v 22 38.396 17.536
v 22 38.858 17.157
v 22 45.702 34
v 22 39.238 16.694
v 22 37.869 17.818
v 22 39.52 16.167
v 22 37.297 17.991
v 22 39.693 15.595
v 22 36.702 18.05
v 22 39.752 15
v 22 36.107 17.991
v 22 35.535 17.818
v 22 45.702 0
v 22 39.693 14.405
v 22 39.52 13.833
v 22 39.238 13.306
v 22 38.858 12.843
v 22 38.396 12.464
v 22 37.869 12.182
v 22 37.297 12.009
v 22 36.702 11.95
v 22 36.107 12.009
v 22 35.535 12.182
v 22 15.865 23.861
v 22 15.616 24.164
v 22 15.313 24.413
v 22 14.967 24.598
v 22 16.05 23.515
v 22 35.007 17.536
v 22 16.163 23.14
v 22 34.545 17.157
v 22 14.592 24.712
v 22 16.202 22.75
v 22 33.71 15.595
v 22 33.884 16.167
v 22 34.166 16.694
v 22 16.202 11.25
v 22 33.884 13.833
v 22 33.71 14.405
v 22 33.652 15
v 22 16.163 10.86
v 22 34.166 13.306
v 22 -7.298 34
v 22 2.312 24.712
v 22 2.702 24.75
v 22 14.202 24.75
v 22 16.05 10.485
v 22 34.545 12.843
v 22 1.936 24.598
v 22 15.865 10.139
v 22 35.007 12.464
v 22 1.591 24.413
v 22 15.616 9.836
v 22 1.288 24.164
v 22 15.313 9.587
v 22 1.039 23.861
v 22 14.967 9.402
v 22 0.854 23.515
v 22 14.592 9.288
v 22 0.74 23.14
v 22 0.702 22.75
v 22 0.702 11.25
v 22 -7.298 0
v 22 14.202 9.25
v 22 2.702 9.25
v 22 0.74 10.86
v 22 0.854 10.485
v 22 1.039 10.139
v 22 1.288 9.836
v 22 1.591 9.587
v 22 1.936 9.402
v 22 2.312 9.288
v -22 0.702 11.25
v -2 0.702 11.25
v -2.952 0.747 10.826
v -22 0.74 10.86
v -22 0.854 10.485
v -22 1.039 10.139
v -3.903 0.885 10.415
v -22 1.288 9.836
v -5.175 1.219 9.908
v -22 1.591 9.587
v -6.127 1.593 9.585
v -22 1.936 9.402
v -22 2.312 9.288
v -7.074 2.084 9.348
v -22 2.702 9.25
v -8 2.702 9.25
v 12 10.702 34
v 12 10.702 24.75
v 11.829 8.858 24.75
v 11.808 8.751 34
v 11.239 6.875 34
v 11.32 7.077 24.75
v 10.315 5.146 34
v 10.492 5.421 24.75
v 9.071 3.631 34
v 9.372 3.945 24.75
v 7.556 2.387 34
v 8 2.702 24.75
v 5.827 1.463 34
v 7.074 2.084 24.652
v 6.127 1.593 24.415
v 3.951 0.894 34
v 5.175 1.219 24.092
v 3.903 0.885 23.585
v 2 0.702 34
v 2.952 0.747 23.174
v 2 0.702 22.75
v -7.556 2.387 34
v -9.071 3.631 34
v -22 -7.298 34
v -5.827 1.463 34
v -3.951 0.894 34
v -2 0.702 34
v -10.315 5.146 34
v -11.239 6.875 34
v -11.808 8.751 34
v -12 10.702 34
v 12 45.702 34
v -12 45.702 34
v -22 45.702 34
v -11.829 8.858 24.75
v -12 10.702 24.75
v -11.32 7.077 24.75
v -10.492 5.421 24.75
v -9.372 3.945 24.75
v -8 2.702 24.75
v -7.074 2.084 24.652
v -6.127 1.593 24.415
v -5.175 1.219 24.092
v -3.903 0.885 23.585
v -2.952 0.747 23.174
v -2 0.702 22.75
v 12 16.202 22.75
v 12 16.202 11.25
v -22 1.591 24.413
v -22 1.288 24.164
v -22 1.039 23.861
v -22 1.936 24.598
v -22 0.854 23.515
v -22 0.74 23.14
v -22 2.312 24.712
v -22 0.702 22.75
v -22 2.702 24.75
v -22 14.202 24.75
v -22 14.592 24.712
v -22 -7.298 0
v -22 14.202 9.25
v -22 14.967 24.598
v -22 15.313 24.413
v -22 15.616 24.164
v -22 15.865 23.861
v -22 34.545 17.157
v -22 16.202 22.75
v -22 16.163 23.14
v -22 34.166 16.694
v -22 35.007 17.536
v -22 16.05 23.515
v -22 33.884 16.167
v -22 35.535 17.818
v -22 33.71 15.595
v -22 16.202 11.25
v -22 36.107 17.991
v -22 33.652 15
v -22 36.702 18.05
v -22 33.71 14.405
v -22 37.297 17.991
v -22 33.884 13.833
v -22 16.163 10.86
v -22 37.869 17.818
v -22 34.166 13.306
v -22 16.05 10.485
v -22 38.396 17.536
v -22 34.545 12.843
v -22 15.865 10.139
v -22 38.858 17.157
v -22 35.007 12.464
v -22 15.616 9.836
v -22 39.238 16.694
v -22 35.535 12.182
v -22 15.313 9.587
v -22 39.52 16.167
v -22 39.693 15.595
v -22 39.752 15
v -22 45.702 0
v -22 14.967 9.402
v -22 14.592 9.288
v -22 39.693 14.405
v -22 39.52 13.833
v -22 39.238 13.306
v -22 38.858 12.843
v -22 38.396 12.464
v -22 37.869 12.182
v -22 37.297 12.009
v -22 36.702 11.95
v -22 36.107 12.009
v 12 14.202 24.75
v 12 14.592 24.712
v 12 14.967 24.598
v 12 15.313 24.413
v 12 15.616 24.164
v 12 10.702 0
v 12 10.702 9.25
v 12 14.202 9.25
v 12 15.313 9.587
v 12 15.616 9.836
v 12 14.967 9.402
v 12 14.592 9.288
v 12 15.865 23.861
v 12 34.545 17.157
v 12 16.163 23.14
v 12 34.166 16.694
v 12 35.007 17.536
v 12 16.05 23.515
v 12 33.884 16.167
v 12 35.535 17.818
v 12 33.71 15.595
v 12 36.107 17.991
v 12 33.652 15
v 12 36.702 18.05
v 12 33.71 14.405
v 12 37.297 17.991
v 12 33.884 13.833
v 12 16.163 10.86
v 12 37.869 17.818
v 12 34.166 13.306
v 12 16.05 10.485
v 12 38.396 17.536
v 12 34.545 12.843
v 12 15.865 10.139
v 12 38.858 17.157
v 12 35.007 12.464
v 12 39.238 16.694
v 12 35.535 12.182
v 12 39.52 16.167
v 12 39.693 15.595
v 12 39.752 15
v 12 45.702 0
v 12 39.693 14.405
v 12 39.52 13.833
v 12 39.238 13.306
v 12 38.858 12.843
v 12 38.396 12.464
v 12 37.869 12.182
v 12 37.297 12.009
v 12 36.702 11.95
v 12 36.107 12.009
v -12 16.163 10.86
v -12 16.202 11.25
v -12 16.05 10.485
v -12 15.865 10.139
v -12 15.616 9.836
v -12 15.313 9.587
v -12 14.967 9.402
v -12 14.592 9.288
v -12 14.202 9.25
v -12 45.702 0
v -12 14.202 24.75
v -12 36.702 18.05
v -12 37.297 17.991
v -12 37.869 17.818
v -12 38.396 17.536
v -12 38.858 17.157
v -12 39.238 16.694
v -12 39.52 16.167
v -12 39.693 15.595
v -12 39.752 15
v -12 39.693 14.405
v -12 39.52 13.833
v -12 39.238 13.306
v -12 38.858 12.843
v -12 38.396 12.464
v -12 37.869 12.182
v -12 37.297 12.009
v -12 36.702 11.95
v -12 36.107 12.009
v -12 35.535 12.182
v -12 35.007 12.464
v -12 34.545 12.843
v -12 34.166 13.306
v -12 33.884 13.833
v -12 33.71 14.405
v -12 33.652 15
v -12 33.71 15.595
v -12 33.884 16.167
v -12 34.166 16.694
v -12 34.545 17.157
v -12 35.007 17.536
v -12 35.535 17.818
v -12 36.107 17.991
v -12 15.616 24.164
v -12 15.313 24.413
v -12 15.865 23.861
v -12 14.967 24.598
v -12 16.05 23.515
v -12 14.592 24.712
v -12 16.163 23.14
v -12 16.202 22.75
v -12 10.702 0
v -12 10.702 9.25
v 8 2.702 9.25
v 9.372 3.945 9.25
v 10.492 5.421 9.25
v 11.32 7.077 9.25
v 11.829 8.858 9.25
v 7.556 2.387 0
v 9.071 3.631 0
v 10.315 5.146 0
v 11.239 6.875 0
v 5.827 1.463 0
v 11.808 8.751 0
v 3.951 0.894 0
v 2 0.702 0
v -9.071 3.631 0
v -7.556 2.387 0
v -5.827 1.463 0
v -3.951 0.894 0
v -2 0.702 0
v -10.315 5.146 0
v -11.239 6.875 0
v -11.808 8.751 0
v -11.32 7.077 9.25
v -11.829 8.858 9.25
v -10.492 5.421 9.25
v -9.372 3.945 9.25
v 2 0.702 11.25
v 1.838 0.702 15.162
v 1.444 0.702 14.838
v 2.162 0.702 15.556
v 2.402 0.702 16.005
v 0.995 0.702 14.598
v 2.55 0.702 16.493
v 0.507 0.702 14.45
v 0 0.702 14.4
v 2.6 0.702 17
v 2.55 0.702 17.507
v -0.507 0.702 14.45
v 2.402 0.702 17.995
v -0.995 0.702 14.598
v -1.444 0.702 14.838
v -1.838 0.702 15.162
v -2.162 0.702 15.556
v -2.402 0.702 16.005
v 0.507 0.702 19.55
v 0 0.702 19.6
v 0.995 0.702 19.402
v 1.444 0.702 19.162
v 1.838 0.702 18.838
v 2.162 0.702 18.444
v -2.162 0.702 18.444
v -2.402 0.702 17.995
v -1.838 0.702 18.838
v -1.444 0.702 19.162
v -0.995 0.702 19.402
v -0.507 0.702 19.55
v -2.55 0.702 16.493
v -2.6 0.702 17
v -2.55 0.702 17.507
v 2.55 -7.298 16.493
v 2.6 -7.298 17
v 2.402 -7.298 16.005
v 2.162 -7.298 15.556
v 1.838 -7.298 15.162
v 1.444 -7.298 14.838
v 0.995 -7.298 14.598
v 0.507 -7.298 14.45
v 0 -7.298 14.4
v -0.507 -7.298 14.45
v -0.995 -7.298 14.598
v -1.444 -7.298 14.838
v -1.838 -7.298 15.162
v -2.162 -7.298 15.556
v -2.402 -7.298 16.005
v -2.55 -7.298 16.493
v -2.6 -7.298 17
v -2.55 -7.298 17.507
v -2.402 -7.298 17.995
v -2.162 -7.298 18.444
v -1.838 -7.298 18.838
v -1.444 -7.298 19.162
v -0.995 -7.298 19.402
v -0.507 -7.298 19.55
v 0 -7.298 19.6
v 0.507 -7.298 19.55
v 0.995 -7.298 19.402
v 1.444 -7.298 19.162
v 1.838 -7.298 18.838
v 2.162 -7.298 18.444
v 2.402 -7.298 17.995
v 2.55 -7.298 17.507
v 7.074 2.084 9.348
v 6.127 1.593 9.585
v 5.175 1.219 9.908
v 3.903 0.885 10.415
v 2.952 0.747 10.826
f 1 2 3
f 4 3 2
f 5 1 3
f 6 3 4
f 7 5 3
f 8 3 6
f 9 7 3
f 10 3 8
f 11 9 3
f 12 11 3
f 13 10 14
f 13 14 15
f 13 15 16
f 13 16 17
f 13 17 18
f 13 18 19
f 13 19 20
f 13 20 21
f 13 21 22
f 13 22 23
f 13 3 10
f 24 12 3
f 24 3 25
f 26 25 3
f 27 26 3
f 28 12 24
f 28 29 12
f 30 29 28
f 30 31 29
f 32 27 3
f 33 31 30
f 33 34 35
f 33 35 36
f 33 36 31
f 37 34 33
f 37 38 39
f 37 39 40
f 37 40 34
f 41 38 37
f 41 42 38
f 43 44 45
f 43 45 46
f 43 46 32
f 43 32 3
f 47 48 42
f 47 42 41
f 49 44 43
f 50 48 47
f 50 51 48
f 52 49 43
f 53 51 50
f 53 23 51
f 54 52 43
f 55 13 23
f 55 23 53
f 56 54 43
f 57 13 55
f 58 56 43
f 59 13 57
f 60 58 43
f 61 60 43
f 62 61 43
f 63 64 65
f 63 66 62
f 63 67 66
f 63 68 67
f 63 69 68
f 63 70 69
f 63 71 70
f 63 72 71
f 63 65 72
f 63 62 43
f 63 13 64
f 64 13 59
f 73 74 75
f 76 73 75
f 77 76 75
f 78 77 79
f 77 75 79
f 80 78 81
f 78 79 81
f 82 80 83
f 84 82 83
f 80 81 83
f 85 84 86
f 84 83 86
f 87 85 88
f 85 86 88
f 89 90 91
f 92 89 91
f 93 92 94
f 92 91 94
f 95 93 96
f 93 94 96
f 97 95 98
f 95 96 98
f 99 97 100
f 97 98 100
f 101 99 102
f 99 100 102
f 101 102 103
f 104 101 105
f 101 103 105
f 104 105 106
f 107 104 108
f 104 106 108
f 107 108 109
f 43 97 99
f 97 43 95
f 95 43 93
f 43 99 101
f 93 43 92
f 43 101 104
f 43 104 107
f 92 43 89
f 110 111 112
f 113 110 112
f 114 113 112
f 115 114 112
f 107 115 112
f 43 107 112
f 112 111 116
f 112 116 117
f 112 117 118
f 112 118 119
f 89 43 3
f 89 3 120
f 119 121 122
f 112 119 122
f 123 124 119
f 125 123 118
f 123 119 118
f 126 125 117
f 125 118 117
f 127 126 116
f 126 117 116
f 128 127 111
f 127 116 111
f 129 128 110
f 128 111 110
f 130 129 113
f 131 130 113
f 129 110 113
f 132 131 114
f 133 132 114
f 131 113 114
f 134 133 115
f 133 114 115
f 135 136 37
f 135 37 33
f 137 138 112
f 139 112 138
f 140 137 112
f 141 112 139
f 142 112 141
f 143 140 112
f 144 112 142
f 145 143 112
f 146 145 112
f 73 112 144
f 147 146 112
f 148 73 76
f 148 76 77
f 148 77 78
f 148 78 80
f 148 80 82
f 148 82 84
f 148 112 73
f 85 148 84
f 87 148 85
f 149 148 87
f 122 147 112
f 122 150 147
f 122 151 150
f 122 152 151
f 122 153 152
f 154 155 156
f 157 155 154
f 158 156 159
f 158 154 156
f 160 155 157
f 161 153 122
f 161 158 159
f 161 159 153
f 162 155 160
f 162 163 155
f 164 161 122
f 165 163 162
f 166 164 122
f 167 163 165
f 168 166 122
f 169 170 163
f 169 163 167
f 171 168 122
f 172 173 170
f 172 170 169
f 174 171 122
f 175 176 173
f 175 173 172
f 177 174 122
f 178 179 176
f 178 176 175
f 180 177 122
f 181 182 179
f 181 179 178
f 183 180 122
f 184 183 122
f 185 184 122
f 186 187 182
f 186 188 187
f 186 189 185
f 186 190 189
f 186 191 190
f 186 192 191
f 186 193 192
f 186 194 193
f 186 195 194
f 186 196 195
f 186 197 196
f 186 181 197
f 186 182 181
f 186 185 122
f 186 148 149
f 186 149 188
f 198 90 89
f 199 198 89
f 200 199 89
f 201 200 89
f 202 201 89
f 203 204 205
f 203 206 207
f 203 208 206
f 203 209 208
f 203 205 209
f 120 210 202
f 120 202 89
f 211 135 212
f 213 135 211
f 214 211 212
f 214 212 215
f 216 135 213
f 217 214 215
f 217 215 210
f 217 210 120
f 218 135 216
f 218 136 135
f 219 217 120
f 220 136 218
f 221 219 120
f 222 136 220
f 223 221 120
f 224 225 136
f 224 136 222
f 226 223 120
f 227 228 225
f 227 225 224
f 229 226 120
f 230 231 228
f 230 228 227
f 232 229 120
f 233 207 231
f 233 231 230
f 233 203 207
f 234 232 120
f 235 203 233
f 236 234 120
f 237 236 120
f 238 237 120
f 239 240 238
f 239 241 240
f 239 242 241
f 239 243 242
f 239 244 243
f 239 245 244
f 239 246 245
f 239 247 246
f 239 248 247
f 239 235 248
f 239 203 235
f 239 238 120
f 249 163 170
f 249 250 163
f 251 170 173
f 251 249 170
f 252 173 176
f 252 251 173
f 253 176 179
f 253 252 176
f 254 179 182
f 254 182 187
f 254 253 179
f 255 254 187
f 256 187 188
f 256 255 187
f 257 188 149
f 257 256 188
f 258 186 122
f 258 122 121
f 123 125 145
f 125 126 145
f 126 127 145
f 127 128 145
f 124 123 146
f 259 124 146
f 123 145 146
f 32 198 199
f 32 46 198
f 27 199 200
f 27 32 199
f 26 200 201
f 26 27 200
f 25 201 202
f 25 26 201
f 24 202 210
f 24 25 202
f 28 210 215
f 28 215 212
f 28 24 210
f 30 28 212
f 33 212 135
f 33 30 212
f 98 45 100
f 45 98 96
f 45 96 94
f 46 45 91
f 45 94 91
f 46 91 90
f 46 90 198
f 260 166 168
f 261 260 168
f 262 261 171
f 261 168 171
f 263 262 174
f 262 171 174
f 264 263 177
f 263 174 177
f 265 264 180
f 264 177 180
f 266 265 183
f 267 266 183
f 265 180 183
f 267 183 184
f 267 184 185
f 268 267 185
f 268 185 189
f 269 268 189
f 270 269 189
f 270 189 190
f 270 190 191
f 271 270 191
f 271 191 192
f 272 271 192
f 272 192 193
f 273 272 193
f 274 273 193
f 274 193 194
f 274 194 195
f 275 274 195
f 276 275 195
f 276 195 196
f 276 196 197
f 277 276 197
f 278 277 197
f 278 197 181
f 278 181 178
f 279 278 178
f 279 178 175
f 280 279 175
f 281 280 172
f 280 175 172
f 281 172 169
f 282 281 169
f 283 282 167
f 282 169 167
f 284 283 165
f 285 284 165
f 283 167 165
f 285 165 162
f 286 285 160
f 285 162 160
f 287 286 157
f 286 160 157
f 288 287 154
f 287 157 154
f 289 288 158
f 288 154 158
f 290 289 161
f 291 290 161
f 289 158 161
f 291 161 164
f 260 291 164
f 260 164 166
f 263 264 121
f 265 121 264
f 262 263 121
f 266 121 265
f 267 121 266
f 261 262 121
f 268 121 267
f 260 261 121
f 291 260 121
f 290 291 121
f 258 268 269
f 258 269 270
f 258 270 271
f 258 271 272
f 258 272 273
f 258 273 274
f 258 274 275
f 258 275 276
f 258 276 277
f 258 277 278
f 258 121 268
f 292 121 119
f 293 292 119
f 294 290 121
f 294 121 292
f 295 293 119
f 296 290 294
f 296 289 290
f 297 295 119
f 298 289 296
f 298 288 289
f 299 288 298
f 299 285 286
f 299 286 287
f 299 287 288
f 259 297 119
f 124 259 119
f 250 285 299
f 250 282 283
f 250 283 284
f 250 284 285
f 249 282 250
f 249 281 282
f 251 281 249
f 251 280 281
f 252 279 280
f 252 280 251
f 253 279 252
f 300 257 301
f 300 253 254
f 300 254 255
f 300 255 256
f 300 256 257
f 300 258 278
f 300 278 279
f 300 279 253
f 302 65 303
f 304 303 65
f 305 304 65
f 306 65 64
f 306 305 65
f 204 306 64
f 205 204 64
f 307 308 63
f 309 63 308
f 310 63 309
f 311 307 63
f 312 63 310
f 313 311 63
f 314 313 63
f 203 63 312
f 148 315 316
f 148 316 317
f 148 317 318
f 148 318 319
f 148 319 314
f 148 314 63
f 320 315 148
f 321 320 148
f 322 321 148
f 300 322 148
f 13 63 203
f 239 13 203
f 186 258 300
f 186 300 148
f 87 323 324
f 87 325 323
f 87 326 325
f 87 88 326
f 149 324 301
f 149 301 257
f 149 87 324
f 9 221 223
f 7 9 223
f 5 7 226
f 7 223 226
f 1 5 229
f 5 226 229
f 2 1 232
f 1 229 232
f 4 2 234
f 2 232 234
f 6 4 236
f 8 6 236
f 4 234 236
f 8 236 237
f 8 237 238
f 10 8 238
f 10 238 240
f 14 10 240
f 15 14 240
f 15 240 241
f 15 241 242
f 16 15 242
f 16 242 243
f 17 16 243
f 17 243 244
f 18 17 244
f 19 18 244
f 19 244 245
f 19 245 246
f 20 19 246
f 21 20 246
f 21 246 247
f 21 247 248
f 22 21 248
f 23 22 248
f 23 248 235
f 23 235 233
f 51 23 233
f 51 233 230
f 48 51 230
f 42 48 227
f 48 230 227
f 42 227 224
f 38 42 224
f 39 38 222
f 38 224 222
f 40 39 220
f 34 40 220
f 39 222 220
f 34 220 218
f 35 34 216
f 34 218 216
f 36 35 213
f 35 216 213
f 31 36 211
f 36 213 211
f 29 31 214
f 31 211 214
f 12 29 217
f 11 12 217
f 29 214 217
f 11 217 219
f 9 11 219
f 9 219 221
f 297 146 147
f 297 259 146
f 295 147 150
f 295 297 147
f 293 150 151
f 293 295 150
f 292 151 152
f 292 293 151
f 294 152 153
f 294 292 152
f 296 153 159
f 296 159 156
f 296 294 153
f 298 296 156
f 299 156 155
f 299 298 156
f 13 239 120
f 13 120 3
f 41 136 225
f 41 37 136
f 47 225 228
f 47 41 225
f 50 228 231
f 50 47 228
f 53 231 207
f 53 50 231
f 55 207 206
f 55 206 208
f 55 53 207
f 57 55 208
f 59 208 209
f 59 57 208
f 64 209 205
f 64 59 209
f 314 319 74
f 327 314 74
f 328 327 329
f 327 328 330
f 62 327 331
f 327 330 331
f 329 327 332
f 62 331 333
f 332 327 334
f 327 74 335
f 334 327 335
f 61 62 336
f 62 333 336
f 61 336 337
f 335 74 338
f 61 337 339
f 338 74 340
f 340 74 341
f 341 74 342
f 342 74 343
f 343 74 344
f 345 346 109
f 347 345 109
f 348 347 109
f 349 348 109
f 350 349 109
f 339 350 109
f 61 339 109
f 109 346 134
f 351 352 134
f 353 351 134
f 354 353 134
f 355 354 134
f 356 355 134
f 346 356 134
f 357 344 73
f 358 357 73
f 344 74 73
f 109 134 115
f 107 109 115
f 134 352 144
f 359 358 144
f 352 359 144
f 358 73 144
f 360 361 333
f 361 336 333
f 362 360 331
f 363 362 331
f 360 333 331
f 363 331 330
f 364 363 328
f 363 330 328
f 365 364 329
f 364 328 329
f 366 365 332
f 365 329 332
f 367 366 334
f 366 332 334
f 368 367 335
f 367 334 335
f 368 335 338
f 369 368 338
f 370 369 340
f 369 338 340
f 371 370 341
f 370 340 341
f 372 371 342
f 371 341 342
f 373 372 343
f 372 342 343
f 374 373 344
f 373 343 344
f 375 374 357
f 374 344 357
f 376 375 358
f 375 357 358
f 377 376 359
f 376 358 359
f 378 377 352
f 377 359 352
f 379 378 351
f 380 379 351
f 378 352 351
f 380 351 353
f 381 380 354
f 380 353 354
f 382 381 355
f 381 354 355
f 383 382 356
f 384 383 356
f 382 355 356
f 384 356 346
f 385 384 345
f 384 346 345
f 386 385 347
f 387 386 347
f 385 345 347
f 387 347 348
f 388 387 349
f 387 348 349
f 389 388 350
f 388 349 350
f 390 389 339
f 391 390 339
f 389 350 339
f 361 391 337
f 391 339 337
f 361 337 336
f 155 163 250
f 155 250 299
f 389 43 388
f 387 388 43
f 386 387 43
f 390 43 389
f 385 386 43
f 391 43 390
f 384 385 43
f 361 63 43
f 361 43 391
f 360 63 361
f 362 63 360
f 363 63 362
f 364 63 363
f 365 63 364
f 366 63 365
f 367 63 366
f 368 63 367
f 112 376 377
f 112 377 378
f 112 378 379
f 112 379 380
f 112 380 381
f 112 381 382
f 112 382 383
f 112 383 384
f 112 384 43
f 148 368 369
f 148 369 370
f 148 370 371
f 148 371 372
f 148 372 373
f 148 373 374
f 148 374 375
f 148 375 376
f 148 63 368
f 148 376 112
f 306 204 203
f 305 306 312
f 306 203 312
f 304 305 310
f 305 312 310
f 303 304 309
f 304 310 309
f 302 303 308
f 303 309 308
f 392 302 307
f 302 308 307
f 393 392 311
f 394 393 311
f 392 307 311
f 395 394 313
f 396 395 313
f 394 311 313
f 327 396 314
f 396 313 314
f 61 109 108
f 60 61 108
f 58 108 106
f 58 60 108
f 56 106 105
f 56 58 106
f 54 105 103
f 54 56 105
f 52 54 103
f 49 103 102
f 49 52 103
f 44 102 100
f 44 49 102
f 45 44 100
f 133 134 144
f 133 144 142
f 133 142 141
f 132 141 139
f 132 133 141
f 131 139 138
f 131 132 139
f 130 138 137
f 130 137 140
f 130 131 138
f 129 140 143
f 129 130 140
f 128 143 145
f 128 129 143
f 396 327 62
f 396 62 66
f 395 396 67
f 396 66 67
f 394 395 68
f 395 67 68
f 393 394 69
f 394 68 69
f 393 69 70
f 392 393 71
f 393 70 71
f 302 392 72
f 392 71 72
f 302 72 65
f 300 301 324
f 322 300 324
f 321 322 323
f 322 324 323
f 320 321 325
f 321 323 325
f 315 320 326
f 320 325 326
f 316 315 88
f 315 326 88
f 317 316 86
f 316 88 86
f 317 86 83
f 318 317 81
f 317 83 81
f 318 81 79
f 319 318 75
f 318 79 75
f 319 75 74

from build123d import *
from OCP.BRepFilletAPI import BRepFilletAPI_MakeFillet

# Parameters (mm, degrees)
EXTRUDE_1_DEPTH     = 34
SKETCH_2_R          = 2.6
CUT_EXTRUDE_1_DEPTH = 30
SKETCH_3_R          = 3.05
CUT_EXTRUDE_2_DEPTH = 50
SKETCH_8_W          = 15.5
SKETCH_8_H          = 15.5
CUT_EXTRUDE_5_DEPTH = 50
FILLET_4_R1         = 2
FILLET_4_R2         = 10


with BuildPart() as part:
    # 草图1 → 凸台-拉伸1 (new body)
    with BuildSketch(Plane.XY):
        Polygon((-22, 45.701761355), (-12, 45.701761355), (-12, 0.701761355), (12, 0.701761355), (12, 45.701761355), (22, 45.701761355), (22, -7.298238645), (-22, -7.298238645), align=None)
    extrude(amount=EXTRUDE_1_DEPTH)

    # 草图2 → 切除-拉伸1 (cut, symmetric)
    with BuildSketch(Plane(origin=(0, 0, 0), x_dir=(1, 0, 0), z_dir=(0, 1, 0))):
        with Locations((0, -17)):
            Circle(SKETCH_2_R)
    extrude(amount=CUT_EXTRUDE_1_DEPTH, both=True, mode=Mode.SUBTRACT)

    # 草图3 → 切除-拉伸2 (cut)
    with BuildSketch(Plane.ZY.offset(22)):
        with Locations((15, 36.701761355)):
            Circle(SKETCH_3_R)
    extrude(amount=-CUT_EXTRUDE_2_DEPTH, mode=Mode.SUBTRACT)

    # 草图8 → 切除-拉伸5 (cut)
    with BuildSketch(Plane.ZY.offset(22)):
        with Locations((17, 8.451761355)):
            Rectangle(SKETCH_8_W, SKETCH_8_H)
    extrude(amount=-CUT_EXTRUDE_5_DEPTH, mode=Mode.SUBTRACT)

    # 圆角4: one fillet with a radius per group of edges: ONE call of the kernel's fillet builder (fillet() takes one radius for all edges)
    fillet_4_edges_1 = [part.edges().sort_by_distance(p)[0] for p in [
        (-17, 16.201761355, 9.25),
        (-17, 16.201761355, 24.75),
        (-17, 0.701761355, 24.75),
        (-17, 0.701761355, 9.25),
        (17, 0.701761355, 9.25),
        (17, 16.201761355, 9.25),
        (17, 0.701761355, 24.75),
        (17, 16.201761355, 24.75),
    ]]
    fillet_4_edges_2 = [part.edges().sort_by_distance(p)[0] for p in [
        (-12, 0.701761355, 4.625),
        (-12, 0.701761355, 29.375),
        (12, 0.701761355, 29.375),
        (12, 0.701761355, 4.625),
    ]]
    fillet_4 = BRepFilletAPI_MakeFillet(part.part.solid().wrapped)
    for e in fillet_4_edges_1:
        fillet_4.Add(FILLET_4_R1, e.wrapped)
    for e in fillet_4_edges_2:
        fillet_4.Add(FILLET_4_R2, e.wrapped)
    add(Compound.cast(fillet_4.Shape()), mode=Mode.REPLACE)


solid = part.part
